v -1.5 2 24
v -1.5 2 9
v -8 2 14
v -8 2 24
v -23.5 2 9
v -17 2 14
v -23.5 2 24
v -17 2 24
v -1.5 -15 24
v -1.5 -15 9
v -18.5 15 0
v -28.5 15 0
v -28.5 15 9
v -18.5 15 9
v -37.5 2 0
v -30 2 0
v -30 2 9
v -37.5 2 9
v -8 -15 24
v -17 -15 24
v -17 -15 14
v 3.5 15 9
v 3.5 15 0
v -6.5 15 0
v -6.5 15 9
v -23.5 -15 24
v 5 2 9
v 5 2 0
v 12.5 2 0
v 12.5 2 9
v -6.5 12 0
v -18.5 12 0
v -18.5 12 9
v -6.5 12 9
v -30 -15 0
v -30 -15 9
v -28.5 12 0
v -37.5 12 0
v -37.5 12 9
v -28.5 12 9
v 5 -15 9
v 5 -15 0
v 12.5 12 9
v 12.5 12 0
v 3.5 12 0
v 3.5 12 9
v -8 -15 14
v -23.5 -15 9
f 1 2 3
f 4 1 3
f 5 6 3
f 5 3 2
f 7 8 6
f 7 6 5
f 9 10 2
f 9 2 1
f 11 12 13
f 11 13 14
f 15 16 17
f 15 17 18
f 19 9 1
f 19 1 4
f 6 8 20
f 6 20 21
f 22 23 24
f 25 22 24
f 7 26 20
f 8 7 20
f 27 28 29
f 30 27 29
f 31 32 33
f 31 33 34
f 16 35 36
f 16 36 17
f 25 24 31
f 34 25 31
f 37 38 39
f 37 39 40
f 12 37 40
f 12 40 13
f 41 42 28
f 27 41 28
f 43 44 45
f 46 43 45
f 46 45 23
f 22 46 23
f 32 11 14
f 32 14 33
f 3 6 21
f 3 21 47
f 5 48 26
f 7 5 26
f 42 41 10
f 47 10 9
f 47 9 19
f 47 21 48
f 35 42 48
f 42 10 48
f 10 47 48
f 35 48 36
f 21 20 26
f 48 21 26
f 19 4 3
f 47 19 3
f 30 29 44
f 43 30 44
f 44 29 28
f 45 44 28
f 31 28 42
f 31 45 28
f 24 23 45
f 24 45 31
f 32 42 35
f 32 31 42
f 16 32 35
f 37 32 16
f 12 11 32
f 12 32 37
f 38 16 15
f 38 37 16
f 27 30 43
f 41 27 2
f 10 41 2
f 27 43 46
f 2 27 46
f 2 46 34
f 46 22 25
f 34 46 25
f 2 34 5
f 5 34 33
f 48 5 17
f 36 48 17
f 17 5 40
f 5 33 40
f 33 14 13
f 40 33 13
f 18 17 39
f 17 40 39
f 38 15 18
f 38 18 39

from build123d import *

# Parameters (mm, degrees)
EXTRUDE_1_DEPTH     = 9
SKETCH_2_W          = 4.5
SKETCH_2_H          = 6.5
EXTRUDE_2_DEPTH     = 17
SKETCH_3_W          = 9
SKETCH_3_H          = 1.5
CUT_EXTRUDE_1_DEPTH = 48.657633177


with BuildPart() as part:
    # Эскиз1 → Бобышка-Вытянуть1 (new body)
    with BuildSketch(Plane.XY):
        Polygon((-12.5, 12), (-12.5, -15), (5, -15), (5, 2), (12.5, 2), (12.5, 12), (3.5, 12), (3.5, 15), (-6.5, 15), (-6.5, 12), align=None)
    extrude_1 = extrude(amount=EXTRUDE_1_DEPTH)

    # Эскиз2 → Бобышка-Вытянуть2 (add)
    with BuildSketch(Plane.XZ.offset(15)):
        Polygon((-8, 15.5), (-8, 9), (-1.5, 9), (-1.5, 24), (-8, 24), align=None)
        with Locations((-10.25, 12.25)):
            Rectangle(SKETCH_2_W, SKETCH_2_H)
    extrude_2 = extrude(amount=-EXTRUDE_2_DEPTH)

    # Зеркальное отражение1: Бобышка-Вытянуть1, Бобышка-Вытянуть2 across plane
    add(extrude_1.mirror(Plane(origin=(-12.5, 0, 9), x_dir=(0, 0, 1), z_dir=(-1, 0, 0))))
    add(extrude_2.mirror(Plane(origin=(-12.5, 0, 9), x_dir=(0, 0, 1), z_dir=(-1, 0, 0))))

    # Эскиз3 → Вырез-Вытянуть1 (cut, through all)
    with BuildSketch(Plane(origin=(0, 2, 0), x_dir=(1, 0, 0), z_dir=(0, 1, 0))):
        with Locations((-12.5, -14.75)):
            Rectangle(SKETCH_3_W, SKETCH_3_H)
    extrude(amount=-CUT_EXTRUDE_1_DEPTH, mode=Mode.SUBTRACT)


solid = part.part
